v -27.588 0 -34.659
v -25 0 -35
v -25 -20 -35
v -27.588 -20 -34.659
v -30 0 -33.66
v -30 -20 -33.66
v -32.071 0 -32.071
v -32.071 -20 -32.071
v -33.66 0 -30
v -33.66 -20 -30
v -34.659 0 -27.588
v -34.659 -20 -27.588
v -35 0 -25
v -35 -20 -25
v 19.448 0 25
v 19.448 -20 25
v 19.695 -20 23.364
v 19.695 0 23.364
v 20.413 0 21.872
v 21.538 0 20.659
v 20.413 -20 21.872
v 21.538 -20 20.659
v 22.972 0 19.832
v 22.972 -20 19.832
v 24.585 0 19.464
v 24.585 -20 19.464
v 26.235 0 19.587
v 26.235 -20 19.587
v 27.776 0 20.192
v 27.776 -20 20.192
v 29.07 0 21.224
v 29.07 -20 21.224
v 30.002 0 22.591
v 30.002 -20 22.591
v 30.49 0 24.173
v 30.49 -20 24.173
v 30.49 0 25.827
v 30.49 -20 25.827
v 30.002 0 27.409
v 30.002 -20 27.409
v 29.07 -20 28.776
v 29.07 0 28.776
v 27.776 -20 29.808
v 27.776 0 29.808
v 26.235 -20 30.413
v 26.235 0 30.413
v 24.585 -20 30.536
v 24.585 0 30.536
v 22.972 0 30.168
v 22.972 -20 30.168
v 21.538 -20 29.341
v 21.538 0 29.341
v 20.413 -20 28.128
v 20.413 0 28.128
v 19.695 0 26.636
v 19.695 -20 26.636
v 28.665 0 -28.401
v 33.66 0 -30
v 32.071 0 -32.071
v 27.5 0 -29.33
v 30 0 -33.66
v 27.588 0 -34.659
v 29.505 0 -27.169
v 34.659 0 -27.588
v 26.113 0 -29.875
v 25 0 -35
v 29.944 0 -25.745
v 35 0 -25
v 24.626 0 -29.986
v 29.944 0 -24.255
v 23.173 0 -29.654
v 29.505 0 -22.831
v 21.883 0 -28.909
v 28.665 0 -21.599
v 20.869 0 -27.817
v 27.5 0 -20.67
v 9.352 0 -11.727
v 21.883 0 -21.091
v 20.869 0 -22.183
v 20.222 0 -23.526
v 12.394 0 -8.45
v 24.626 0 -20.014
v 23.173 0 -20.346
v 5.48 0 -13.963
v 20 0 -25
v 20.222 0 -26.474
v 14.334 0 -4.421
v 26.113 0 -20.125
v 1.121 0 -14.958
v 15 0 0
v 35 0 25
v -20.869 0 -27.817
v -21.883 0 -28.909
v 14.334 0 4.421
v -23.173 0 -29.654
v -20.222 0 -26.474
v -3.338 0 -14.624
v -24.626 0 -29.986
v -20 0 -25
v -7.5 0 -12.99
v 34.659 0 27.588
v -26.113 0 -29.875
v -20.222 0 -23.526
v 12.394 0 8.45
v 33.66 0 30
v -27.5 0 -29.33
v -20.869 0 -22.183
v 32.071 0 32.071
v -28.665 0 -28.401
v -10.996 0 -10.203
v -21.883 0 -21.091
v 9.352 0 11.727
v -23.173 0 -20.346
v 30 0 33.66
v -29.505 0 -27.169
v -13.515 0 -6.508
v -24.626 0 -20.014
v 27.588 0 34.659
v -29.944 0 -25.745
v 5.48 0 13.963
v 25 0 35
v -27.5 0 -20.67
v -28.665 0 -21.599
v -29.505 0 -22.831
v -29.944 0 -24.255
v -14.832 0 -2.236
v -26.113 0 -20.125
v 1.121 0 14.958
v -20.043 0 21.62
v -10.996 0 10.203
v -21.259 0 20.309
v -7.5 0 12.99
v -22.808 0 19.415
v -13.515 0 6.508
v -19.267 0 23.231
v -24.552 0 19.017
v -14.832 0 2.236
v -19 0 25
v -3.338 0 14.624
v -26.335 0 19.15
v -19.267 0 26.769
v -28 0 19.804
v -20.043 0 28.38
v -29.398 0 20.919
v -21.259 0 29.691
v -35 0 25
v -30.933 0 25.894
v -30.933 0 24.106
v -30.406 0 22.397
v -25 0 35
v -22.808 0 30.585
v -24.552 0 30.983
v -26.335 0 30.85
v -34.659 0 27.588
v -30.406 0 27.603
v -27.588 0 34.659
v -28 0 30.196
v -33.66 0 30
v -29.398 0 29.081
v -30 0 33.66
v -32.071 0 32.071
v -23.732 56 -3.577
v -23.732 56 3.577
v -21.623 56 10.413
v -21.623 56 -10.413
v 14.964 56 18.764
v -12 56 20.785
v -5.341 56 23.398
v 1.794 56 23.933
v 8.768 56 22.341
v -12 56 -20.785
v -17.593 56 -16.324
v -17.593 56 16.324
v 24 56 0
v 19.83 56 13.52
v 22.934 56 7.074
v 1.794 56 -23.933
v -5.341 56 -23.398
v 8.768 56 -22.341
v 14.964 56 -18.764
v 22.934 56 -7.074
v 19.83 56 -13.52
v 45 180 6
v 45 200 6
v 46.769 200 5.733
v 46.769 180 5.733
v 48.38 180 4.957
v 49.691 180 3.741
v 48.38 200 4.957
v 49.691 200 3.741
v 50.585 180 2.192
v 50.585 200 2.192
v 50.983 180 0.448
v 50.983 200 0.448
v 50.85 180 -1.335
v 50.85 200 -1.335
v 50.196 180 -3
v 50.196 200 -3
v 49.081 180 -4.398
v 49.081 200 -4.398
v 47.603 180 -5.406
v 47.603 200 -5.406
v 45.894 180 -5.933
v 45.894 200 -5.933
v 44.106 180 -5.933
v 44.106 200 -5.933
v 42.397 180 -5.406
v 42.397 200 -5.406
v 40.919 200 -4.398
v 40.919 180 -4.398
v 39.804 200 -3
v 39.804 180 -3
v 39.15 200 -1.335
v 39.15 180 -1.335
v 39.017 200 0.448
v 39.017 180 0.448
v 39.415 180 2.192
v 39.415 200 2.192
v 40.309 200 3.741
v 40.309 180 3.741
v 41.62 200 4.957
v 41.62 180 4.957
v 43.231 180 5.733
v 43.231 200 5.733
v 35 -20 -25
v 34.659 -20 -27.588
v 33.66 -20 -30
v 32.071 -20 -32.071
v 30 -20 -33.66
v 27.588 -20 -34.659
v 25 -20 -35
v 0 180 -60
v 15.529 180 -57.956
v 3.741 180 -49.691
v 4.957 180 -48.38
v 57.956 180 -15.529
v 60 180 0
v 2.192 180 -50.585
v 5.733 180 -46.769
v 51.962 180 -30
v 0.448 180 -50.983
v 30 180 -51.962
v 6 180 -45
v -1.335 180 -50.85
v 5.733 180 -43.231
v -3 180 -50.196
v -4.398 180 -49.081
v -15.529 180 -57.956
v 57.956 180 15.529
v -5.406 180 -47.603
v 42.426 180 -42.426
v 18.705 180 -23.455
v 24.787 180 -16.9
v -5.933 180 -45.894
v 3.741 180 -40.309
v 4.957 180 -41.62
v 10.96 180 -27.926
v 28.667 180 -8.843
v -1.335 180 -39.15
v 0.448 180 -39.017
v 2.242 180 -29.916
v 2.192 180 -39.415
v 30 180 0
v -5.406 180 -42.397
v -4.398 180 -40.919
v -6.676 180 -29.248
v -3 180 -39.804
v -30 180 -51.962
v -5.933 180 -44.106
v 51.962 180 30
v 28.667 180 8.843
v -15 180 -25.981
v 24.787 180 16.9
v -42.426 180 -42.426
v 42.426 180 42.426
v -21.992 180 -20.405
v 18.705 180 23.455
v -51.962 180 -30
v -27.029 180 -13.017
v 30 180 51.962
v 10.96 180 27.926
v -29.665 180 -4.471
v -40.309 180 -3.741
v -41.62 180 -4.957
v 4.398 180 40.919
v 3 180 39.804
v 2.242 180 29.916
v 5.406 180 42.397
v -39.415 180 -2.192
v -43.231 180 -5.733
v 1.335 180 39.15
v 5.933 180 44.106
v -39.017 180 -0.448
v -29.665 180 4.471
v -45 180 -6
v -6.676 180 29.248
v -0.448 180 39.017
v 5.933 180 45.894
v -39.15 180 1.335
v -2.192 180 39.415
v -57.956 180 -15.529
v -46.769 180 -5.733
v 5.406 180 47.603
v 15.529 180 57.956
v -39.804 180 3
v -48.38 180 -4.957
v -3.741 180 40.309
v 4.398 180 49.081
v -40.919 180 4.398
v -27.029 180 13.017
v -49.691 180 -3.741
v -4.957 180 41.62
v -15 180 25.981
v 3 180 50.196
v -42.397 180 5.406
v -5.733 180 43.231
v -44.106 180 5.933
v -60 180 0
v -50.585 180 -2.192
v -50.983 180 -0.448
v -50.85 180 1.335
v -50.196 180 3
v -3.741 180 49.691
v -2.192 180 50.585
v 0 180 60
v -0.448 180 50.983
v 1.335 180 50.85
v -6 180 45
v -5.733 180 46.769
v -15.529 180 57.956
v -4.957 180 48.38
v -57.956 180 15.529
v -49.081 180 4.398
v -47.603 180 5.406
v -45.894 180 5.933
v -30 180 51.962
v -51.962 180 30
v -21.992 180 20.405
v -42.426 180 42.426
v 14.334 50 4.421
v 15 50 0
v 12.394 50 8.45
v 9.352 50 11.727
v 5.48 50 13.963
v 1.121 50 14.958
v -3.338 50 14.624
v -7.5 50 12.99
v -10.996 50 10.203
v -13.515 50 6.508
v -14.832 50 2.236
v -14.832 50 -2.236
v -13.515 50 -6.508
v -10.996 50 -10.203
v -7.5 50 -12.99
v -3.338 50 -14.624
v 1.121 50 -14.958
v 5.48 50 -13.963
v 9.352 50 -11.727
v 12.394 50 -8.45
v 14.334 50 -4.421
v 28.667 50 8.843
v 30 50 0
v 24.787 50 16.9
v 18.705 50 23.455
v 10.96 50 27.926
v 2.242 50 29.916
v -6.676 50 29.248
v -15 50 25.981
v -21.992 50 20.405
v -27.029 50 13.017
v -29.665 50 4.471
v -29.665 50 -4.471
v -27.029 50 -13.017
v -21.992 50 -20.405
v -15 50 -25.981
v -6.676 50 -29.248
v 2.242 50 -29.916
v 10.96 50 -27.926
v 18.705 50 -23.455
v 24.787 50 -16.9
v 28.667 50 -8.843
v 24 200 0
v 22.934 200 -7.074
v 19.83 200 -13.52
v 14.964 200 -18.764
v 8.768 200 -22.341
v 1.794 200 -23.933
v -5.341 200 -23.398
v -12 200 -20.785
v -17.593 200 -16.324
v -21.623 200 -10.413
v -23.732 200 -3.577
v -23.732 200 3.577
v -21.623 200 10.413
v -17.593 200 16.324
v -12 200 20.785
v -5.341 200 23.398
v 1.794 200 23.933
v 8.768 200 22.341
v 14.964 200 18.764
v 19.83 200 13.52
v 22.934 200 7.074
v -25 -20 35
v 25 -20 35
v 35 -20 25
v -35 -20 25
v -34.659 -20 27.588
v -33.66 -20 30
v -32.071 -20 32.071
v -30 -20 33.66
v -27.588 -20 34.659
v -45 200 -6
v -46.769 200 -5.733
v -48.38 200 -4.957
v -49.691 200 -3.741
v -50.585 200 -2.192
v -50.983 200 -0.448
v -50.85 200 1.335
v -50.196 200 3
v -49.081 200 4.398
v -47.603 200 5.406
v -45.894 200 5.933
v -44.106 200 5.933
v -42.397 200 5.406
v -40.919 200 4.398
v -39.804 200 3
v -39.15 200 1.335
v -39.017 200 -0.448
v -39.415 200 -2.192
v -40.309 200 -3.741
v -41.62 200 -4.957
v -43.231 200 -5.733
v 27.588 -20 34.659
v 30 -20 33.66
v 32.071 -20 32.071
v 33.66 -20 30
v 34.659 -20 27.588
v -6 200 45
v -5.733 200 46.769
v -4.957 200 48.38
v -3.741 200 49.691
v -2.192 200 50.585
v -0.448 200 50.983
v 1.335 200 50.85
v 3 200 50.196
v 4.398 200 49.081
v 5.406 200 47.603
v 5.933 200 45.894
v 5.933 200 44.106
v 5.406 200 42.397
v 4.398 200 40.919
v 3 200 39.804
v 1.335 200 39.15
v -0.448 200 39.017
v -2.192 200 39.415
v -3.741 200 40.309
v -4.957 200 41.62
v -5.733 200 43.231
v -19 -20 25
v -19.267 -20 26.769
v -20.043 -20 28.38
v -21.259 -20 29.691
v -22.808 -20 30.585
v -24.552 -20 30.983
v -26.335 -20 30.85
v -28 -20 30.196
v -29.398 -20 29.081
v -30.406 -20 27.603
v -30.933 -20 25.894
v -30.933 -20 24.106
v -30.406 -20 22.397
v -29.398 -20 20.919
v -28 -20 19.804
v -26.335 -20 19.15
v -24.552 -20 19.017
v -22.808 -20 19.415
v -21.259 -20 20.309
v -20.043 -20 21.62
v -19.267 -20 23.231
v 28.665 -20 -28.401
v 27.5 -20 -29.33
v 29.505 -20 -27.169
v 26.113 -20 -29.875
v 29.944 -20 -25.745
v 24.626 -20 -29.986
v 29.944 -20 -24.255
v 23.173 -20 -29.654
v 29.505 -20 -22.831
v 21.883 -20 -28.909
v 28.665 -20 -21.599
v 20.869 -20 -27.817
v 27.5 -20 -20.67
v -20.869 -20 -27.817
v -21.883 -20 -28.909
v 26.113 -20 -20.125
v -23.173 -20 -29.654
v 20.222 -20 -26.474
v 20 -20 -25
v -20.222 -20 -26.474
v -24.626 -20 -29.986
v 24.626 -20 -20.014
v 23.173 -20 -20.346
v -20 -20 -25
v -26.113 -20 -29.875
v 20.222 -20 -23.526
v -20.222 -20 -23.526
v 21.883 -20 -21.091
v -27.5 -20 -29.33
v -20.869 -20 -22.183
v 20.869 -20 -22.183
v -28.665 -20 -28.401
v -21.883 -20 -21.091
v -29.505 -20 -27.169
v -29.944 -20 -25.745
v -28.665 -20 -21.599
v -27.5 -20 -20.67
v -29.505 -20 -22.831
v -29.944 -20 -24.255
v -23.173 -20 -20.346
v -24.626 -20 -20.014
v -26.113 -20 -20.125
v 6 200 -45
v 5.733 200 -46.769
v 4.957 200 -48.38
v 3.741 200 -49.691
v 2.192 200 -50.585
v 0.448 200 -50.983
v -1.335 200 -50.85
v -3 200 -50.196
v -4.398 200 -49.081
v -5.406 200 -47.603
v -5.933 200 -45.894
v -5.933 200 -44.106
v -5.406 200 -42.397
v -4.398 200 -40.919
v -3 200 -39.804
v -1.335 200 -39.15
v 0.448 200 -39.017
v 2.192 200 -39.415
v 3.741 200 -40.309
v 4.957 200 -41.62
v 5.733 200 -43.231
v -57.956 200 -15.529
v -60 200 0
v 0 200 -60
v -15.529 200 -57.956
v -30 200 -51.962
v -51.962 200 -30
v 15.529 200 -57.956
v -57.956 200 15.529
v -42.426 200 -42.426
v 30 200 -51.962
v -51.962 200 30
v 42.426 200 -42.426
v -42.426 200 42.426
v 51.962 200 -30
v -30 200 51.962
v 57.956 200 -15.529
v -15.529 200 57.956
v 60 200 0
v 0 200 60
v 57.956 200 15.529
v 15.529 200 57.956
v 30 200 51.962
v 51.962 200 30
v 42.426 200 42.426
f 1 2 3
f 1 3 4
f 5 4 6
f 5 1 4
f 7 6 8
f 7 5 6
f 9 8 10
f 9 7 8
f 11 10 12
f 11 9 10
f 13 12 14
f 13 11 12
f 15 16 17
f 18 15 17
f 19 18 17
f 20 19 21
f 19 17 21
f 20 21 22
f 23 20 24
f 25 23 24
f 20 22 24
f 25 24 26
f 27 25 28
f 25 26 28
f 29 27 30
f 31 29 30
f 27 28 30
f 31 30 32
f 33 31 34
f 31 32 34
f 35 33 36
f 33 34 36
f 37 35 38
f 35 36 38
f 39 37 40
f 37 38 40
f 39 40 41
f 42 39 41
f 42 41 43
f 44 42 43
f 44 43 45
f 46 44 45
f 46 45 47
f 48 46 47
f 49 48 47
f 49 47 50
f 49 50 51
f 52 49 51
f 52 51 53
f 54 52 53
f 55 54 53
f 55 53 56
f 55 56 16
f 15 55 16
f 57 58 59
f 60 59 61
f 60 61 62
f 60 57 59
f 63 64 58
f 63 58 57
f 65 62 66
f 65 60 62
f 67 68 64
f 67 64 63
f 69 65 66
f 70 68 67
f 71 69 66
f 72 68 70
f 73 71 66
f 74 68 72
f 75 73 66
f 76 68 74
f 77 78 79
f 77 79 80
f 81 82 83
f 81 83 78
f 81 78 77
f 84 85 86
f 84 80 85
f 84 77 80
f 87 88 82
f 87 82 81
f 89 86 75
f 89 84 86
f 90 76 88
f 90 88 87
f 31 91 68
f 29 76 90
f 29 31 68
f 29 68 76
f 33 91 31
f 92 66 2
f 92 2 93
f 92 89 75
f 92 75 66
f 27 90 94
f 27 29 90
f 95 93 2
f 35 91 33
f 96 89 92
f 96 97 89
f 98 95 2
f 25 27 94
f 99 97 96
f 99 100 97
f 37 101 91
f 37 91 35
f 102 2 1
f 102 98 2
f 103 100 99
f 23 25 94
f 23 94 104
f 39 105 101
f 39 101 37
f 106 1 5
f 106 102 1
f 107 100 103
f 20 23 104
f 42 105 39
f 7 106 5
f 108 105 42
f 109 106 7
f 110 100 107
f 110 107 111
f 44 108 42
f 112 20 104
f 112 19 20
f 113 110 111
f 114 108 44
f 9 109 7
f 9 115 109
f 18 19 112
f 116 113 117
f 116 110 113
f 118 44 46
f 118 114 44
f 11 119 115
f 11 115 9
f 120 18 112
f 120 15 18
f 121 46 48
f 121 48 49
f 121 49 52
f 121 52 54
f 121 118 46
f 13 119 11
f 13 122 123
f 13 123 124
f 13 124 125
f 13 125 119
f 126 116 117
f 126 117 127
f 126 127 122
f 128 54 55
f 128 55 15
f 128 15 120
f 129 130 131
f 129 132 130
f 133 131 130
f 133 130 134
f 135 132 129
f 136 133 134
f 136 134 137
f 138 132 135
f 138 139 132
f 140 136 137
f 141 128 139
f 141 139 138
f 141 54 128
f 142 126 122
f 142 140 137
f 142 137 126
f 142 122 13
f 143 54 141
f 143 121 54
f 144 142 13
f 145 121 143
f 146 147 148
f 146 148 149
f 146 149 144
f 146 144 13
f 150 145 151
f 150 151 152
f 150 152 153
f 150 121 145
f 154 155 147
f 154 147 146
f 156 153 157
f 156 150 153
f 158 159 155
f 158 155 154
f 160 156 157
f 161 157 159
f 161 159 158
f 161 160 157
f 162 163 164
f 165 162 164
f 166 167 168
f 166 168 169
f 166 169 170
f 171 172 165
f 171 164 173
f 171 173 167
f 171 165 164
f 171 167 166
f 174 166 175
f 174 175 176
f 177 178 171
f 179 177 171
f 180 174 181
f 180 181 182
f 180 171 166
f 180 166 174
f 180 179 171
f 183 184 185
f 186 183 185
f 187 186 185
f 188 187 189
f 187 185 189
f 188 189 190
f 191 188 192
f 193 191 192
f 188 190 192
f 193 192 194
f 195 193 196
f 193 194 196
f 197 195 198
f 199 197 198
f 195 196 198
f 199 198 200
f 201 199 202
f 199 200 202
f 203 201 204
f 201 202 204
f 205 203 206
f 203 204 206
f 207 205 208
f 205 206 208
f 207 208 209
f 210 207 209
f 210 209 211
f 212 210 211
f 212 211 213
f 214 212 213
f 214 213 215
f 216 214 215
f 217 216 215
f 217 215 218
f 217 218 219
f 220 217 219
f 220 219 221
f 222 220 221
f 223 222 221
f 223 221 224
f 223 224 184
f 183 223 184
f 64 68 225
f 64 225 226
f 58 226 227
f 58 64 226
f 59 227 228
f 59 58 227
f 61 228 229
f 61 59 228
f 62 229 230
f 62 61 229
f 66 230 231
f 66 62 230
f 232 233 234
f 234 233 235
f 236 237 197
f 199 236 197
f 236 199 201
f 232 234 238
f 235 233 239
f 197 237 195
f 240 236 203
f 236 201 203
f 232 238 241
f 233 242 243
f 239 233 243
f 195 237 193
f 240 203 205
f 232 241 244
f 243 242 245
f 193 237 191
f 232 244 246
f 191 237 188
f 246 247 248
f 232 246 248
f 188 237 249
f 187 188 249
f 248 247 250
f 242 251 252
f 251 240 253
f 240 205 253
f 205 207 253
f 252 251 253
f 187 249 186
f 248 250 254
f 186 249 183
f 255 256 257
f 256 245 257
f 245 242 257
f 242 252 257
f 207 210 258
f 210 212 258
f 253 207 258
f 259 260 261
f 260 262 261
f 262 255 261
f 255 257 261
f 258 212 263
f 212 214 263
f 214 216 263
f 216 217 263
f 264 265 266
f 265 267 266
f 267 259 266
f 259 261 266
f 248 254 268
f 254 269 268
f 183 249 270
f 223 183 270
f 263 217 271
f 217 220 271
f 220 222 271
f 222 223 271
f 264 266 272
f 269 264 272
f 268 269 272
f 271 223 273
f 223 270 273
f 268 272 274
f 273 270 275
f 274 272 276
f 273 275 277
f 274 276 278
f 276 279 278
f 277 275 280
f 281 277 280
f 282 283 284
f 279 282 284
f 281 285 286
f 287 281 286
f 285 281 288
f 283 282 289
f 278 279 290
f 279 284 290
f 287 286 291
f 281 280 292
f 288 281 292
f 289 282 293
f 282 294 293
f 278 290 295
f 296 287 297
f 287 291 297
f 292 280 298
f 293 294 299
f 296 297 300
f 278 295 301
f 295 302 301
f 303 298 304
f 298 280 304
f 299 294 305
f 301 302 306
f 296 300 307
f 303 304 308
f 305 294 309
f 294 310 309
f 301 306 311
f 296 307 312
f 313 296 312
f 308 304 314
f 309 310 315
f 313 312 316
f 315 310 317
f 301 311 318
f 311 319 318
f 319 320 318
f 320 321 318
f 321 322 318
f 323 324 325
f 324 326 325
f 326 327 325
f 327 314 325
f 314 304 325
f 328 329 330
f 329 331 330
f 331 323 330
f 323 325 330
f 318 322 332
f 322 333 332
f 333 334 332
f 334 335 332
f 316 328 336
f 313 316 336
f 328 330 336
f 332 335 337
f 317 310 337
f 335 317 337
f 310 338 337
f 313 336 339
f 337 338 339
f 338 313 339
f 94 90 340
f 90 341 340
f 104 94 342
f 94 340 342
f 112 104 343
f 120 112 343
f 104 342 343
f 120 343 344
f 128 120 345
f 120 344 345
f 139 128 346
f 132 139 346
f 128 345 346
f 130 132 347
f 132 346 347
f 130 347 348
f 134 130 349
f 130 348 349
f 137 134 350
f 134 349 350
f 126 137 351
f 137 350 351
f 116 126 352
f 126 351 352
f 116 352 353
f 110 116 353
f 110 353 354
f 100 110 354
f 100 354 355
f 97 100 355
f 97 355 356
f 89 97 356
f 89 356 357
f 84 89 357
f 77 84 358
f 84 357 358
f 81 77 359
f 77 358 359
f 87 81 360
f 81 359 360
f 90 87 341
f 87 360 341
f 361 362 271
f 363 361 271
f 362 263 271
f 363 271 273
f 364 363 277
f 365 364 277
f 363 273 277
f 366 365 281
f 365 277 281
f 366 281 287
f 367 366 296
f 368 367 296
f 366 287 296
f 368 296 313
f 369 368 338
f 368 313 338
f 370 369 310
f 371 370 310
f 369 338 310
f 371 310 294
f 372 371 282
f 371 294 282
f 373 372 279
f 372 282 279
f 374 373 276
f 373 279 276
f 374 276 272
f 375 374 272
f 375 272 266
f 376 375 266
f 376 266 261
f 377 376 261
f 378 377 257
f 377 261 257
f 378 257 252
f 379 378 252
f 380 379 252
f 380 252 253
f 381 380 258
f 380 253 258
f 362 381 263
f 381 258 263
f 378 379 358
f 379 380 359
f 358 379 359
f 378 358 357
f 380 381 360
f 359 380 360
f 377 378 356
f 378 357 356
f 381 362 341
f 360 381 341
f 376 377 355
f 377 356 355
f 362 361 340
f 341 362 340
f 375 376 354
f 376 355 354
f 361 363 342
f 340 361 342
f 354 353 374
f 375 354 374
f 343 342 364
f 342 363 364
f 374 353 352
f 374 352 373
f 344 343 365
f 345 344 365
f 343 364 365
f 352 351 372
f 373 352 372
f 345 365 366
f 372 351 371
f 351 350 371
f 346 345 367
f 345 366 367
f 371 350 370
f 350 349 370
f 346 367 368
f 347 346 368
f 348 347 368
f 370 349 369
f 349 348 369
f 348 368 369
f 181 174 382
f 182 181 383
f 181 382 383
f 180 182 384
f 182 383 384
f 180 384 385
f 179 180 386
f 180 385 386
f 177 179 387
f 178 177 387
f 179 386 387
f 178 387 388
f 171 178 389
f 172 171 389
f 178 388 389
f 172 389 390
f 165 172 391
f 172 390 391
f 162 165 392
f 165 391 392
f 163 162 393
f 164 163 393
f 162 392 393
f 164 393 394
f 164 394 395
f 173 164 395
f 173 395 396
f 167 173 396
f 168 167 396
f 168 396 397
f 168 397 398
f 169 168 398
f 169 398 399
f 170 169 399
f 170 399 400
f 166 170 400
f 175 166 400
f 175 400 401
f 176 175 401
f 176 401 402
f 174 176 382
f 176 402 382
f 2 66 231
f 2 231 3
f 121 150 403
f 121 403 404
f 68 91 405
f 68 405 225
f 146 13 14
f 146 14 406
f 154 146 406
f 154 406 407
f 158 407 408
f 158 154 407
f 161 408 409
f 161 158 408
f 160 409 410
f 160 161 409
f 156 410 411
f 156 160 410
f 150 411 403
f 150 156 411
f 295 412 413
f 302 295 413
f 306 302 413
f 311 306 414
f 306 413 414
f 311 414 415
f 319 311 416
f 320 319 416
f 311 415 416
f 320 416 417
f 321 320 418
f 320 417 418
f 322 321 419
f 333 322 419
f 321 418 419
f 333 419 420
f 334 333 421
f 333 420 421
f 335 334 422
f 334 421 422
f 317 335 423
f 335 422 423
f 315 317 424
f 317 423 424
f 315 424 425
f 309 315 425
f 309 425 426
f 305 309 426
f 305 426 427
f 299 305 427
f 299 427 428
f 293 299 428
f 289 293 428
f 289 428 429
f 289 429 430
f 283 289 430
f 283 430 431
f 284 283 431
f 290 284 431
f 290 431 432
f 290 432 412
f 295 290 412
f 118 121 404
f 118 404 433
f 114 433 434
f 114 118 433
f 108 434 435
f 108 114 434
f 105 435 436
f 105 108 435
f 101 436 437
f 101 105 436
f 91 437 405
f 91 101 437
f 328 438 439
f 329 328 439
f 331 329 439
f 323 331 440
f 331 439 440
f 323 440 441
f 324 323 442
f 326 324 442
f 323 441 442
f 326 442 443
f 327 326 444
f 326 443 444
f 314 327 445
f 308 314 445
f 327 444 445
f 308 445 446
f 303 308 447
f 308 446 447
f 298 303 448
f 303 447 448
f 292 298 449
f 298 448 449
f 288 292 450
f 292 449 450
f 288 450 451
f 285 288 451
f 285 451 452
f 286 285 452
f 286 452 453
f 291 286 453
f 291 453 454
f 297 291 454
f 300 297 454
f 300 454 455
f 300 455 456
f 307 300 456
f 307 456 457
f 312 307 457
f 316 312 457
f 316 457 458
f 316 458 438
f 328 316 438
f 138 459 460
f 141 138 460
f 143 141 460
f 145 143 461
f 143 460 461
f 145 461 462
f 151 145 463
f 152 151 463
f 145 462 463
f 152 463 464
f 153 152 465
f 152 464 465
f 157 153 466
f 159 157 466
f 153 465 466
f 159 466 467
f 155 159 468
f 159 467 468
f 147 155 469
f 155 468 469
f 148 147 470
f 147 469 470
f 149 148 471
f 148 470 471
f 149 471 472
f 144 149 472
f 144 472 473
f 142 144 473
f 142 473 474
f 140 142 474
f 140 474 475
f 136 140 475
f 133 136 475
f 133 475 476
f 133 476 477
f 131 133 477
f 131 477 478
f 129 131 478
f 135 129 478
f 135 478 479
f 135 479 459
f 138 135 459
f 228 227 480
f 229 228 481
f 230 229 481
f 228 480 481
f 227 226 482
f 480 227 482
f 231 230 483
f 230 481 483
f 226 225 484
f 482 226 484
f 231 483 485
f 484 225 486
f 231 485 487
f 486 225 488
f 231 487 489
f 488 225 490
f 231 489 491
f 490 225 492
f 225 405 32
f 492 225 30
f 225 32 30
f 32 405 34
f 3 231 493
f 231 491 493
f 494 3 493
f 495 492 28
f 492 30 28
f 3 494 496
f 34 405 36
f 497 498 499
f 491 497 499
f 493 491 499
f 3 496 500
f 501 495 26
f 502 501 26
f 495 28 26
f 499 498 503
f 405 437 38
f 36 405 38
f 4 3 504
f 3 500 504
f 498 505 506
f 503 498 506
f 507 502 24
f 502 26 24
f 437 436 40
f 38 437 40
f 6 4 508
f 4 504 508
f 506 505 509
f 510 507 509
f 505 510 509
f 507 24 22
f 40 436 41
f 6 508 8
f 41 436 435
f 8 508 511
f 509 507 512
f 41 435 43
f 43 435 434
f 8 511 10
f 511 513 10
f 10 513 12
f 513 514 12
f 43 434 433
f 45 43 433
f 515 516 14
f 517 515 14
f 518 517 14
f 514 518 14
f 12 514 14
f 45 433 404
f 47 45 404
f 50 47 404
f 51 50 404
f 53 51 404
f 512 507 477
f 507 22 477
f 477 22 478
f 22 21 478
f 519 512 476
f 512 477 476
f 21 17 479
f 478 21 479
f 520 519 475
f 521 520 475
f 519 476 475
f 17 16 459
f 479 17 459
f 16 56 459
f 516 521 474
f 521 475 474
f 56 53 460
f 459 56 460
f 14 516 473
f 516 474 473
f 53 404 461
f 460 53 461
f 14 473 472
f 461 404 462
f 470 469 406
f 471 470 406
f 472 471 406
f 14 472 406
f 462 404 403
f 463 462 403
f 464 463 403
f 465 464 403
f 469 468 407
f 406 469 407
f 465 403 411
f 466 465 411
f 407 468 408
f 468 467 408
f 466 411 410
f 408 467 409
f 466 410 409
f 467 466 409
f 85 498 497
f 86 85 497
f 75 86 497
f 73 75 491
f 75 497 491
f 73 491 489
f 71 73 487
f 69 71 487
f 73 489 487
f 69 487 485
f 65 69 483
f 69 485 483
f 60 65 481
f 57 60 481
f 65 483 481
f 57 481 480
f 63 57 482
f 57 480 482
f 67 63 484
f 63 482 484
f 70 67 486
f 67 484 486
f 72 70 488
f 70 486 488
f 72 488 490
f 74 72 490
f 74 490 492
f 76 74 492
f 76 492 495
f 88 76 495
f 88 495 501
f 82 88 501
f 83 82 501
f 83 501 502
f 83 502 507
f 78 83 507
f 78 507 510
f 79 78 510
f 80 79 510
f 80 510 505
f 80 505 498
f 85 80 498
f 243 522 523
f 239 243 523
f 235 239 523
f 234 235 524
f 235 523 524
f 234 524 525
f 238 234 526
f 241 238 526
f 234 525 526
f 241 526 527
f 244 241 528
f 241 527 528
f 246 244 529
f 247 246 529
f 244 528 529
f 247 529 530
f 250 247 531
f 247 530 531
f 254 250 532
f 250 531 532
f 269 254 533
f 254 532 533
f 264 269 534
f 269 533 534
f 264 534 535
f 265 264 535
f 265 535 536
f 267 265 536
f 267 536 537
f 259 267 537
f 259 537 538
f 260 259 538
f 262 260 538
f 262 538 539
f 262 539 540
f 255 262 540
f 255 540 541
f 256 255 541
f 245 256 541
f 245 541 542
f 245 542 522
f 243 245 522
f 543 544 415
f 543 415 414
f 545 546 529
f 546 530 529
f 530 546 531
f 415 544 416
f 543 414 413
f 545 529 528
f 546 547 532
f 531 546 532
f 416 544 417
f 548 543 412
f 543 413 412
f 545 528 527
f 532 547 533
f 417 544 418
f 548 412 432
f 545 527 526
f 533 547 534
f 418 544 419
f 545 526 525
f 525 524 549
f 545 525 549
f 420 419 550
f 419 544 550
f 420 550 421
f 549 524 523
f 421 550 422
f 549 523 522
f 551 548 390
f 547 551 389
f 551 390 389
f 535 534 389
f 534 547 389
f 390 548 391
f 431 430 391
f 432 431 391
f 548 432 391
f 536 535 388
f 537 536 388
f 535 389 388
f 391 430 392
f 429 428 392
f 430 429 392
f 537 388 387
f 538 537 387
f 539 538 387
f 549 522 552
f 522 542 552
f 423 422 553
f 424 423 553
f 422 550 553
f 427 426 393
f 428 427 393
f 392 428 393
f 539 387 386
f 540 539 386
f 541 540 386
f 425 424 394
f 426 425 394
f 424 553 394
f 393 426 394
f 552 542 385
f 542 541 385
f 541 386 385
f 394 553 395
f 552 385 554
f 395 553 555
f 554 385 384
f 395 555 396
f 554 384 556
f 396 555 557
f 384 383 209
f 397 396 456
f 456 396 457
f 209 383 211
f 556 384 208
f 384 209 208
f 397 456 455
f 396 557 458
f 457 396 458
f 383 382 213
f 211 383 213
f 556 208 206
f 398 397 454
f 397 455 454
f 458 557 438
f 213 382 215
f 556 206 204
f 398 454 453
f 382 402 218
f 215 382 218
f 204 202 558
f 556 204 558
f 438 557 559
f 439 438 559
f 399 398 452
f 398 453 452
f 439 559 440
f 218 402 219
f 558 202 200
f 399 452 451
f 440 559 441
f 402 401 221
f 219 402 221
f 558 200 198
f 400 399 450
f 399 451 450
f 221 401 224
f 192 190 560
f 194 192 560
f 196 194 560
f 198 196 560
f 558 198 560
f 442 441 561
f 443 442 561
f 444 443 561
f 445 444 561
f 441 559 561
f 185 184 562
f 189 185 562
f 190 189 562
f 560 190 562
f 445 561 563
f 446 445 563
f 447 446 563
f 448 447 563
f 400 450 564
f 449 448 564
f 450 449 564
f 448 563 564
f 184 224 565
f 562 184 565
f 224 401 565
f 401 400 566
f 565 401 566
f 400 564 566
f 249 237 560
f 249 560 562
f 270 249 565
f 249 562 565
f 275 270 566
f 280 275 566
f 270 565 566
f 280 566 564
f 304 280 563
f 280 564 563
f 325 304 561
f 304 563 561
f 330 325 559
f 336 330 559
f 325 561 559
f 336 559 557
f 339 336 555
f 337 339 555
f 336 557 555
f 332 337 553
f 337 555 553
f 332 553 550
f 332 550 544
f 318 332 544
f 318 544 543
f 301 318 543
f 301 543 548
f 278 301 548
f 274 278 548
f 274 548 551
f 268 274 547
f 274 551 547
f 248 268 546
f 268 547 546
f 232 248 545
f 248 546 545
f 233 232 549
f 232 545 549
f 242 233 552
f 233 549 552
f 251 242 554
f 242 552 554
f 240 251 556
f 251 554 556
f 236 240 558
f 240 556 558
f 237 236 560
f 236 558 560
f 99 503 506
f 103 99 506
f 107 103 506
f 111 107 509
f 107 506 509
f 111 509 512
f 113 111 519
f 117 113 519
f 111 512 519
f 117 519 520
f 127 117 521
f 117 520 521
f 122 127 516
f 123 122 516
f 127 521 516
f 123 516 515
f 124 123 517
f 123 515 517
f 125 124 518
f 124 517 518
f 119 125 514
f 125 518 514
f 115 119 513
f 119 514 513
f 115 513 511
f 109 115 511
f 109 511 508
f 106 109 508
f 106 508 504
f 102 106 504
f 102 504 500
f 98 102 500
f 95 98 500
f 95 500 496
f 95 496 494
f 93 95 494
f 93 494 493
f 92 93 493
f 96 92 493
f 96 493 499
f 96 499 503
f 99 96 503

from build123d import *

# Parameters (mm, degrees)
SKETCH2_R                      = 6
CUT_EXTRUDE1_DEPTH             = 201
CIRPATTERN1_COUNT              = 4
SKETCH3_R                      = 24
CUT_EXTRUDE2_DEPTH             = 144
BOSS_EXTRUDE2_DEPTH            = 20
CUT_EXTRUDE3_REACH             = 222
SKETCH8_R                      = 6
CUT_EXTRUDE4_REACH             = 222
SKETCH10_R                     = 5.551973051
CUT_EXTRUDE5_REACH             = 222
SKETCH11_R                     = 5
CUT_EXTRUDE6_REACH             = 222
SKETCH12_R                     = 5
CUT_EXTRUDE6_DIRECTION_2_DEPTH = 1


with BuildPart() as part:
    # Sketch1 → Revolve1 (revolve)
    with BuildSketch(Plane.XY):
        Polygon((0, 0), (15, 0), (15, 50), (30, 50), (30, 180), (60, 180), (60, 200), (0, 200), align=None)
    revolve(axis=Axis((0, 218.08318264, 0), (0, -1, 0)))

    # Sketch2 → Cut-Extrude1 (cut, through all)
    with BuildSketch(Plane(origin=(0, 200, 0), x_dir=(1, 0, 0), z_dir=(0, 1, 0))):
        with Locations((0, 45)):
            Circle(SKETCH2_R)
    cut_extrude1 = extrude(amount=-CUT_EXTRUDE1_DEPTH, mode=Mode.SUBTRACT)

    # CirPattern1: Cut-Extrude1 ×4 about axis
    cirpattern1_axis = Axis((0, 0, 0), (0, 1, 0))
    for i in range(1, CIRPATTERN1_COUNT):
        add(cut_extrude1.rotate(cirpattern1_axis, i * 360 / CIRPATTERN1_COUNT), mode=Mode.SUBTRACT)

    # Sketch3 → Cut-Extrude2 (cut)
    with BuildSketch(Plane(origin=(0, 200, 0), x_dir=(1, 0, 0), z_dir=(0, 1, 0))):
        Circle(SKETCH3_R)
    extrude(amount=-CUT_EXTRUDE2_DEPTH, mode=Mode.SUBTRACT)

    # Sketch4 → Boss-Extrude2 (add)
    with BuildSketch(Plane.XZ):
        with BuildLine():
            Line((-25, 35), (25, 35))
            ThreePointArc((25, 35), (32.071067812, 32.071067812), (35, 25))
            Line((35, 25), (35, -25))
            ThreePointArc((35, -25), (32.071067812, -32.071067812), (25, -35))
            Line((25, -35), (-25, -35))
            ThreePointArc((-25, -35), (-32.071067812, -32.071067812), (-35, -25))
            Line((-35, -25), (-35, 25))
            ThreePointArc((-35, 25), (-32.071067812, 32.071067812), (-25, 35))
        make_face()
    extrude(amount=BOSS_EXTRUDE2_DEPTH)

    # Sketch8 → Cut-Extrude3 (cut, up to next)
    with BuildSketch(Plane.XZ.offset(20), mode=Mode.PRIVATE) as cut_extrude3_sk1:
        with Locations((-25, 25)):
            Circle(SKETCH8_R)
    cut_extrude3_tool1 = extrude(cut_extrude3_sk1.sketch, amount=-CUT_EXTRUDE3_REACH, mode=Mode.PRIVATE) & part.part
    add(cut_extrude3_tool1.solids().sort_by_distance((-25, -20, 25))[0], mode=Mode.SUBTRACT)

    # Sketch10 → Cut-Extrude4 (cut, up to next)
    with BuildSketch(Plane(origin=(0, -20, 0), x_dir=(-1, 0, 0), z_dir=(0, -1, 0)), mode=Mode.PRIVATE) as cut_extrude4_sk1:
        with Locations((-25, -25)):
            Circle(SKETCH10_R)
    cut_extrude4_tool1 = extrude(cut_extrude4_sk1.sketch, amount=-CUT_EXTRUDE4_REACH, mode=Mode.PRIVATE) & part.part
    add(cut_extrude4_tool1.solids().sort_by_distance((25, -20, 25))[0], mode=Mode.SUBTRACT)

    # Sketch11 → Cut-Extrude5 (cut, up to next)
    with BuildSketch(Plane(origin=(0, -20, 0), x_dir=(-1, 0, 0), z_dir=(0, -1, 0)), mode=Mode.PRIVATE) as cut_extrude5_sk1:
        with Locations((-25, 25)):
            Circle(SKETCH11_R)
    cut_extrude5_tool1 = extrude(cut_extrude5_sk1.sketch, amount=-CUT_EXTRUDE5_REACH, mode=Mode.PRIVATE) & part.part
    add(cut_extrude5_tool1.solids().sort_by_distance((25, -20, -25))[0], mode=Mode.SUBTRACT)

    # Sketch12 → Cut-Extrude6 (cut, up to next)
    with BuildSketch(Plane.XZ.offset(20), mode=Mode.PRIVATE) as cut_extrude6_sk1:
        with Locations((-25, -25)):
            Circle(SKETCH12_R)
    cut_extrude6_tool1 = extrude(cut_extrude6_sk1.sketch, amount=-CUT_EXTRUDE6_REACH, mode=Mode.PRIVATE) & part.part
    add(cut_extrude6_tool1.solids().sort_by_distance((-25, -20, -25))[0], mode=Mode.SUBTRACT)

    # Sketch12 → Cut-Extrude6 direction 2 (cut)
    with BuildSketch(Plane.XZ.offset(20)):
        with Locations((-25, -25)):
            Circle(SKETCH12_R)
    extrude(amount=CUT_EXTRUDE6_DIRECTION_2_DEPTH, mode=Mode.SUBTRACT)


solid = part.part
